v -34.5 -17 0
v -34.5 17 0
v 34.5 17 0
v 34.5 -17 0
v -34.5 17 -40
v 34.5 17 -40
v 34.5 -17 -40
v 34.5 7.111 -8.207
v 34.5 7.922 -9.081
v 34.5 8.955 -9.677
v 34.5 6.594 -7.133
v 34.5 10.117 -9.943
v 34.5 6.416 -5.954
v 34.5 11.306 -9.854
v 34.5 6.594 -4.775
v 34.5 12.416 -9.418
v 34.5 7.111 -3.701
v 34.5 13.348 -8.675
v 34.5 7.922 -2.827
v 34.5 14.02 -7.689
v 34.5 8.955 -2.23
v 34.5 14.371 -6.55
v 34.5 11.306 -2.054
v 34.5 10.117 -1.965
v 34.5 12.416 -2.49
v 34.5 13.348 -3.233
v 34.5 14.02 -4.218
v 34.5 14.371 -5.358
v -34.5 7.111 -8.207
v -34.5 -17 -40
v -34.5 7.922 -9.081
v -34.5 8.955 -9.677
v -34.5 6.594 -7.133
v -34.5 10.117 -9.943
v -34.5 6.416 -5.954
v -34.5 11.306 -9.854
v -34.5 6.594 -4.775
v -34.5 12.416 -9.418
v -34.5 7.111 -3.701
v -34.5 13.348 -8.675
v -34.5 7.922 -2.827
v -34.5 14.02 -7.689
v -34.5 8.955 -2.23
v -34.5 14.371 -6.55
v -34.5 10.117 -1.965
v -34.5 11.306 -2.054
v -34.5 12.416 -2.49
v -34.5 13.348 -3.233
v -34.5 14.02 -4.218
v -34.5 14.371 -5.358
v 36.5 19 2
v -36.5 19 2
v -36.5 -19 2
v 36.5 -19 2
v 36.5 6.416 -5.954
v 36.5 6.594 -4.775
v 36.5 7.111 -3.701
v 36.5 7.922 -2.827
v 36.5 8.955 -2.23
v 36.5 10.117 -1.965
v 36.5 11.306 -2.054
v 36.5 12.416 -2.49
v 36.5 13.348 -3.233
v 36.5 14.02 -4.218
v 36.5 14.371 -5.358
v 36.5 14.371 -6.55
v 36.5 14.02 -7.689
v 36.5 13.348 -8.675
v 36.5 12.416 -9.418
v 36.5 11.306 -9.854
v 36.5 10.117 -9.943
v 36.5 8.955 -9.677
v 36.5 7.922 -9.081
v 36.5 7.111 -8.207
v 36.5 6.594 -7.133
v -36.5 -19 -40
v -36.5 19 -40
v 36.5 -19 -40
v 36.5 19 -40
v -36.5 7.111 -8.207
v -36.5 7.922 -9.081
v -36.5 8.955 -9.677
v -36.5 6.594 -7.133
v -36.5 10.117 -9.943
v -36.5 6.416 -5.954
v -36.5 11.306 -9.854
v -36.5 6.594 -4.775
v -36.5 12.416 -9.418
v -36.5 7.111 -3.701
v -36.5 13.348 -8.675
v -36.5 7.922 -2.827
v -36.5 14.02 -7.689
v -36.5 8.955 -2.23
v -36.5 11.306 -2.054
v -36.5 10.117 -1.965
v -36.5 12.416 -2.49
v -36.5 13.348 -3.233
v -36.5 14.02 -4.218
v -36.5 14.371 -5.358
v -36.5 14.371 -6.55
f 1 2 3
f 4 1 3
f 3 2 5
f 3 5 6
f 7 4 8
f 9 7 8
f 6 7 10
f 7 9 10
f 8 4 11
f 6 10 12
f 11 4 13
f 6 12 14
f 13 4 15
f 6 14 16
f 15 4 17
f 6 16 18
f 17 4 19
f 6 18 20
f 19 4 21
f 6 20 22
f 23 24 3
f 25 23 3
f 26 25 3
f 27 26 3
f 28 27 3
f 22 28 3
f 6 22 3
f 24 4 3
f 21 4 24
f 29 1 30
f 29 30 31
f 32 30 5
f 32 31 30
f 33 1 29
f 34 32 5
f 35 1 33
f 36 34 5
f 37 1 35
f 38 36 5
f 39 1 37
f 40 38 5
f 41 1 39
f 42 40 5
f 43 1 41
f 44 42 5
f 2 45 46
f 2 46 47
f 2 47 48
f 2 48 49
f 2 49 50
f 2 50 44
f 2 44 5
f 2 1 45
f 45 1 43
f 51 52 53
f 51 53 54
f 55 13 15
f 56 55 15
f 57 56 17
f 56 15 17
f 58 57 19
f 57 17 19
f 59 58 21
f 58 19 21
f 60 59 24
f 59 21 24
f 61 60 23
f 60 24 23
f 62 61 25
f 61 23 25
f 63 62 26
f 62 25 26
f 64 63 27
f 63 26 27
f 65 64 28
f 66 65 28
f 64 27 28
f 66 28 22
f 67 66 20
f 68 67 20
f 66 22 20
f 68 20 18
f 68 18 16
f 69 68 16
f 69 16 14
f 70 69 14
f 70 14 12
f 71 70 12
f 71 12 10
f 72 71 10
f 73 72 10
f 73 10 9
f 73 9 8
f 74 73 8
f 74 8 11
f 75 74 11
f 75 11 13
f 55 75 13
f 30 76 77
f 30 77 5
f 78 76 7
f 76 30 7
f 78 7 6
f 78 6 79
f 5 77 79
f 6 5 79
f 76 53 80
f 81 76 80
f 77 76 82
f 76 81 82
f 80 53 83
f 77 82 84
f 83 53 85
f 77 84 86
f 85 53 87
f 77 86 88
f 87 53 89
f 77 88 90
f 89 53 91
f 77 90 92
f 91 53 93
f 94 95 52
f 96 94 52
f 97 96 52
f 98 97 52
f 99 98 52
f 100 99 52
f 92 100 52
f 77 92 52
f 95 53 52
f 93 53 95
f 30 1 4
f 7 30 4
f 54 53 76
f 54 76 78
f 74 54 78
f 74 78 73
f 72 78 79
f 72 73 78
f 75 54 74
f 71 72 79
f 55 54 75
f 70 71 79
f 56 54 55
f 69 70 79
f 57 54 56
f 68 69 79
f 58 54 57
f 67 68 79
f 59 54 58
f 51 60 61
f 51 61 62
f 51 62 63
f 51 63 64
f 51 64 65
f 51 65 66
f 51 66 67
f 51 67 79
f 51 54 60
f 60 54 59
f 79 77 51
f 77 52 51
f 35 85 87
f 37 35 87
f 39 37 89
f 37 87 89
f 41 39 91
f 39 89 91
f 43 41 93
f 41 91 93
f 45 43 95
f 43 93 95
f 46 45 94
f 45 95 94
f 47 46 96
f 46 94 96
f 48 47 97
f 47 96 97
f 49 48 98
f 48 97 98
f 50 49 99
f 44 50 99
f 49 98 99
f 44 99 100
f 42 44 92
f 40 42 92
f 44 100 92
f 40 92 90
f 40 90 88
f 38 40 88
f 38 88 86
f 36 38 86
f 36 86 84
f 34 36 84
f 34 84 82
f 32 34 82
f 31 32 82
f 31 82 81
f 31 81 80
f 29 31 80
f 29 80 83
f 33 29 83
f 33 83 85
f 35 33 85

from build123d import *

# Parameters (mm, degrees)
F0_W     = 73
F0_H     = 38
F0_W_2   = 69
F0_H_2   = 34
F1_DEPTH = 2
F2_DEPTH = 40
F3_R     = 4
F4_DEPTH = 73.001


with BuildPart() as f1:
    # F0 (on Top) → F1 (new body)
    with BuildSketch(Plane.XY):
        Rectangle(F0_W, F0_H)
        Rectangle(F0_W_2, F0_H_2, mode=Mode.SUBTRACT)
        Rectangle(F0_W_2, F0_H_2)
    extrude(amount=F1_DEPTH)

    # F0 (on Top) → F2 (join)
    with BuildSketch(Plane.XY):
        Rectangle(F0_W, F0_H)
        Rectangle(F0_W_2, F0_H_2, mode=Mode.SUBTRACT)
    extrude(amount=-F2_DEPTH)

    # F3 (on face) → F4 (cut, through all)
    with BuildSketch(Plane(origin=(-36.5, 0, 0), x_dir=(0, -1, 0), z_dir=(-1, 0, 0))):
        with Locations((-10.416073, -5.953962)):
            Circle(F3_R)
    extrude(amount=-F4_DEPTH, mode=Mode.SUBTRACT)


solid = f1.part
